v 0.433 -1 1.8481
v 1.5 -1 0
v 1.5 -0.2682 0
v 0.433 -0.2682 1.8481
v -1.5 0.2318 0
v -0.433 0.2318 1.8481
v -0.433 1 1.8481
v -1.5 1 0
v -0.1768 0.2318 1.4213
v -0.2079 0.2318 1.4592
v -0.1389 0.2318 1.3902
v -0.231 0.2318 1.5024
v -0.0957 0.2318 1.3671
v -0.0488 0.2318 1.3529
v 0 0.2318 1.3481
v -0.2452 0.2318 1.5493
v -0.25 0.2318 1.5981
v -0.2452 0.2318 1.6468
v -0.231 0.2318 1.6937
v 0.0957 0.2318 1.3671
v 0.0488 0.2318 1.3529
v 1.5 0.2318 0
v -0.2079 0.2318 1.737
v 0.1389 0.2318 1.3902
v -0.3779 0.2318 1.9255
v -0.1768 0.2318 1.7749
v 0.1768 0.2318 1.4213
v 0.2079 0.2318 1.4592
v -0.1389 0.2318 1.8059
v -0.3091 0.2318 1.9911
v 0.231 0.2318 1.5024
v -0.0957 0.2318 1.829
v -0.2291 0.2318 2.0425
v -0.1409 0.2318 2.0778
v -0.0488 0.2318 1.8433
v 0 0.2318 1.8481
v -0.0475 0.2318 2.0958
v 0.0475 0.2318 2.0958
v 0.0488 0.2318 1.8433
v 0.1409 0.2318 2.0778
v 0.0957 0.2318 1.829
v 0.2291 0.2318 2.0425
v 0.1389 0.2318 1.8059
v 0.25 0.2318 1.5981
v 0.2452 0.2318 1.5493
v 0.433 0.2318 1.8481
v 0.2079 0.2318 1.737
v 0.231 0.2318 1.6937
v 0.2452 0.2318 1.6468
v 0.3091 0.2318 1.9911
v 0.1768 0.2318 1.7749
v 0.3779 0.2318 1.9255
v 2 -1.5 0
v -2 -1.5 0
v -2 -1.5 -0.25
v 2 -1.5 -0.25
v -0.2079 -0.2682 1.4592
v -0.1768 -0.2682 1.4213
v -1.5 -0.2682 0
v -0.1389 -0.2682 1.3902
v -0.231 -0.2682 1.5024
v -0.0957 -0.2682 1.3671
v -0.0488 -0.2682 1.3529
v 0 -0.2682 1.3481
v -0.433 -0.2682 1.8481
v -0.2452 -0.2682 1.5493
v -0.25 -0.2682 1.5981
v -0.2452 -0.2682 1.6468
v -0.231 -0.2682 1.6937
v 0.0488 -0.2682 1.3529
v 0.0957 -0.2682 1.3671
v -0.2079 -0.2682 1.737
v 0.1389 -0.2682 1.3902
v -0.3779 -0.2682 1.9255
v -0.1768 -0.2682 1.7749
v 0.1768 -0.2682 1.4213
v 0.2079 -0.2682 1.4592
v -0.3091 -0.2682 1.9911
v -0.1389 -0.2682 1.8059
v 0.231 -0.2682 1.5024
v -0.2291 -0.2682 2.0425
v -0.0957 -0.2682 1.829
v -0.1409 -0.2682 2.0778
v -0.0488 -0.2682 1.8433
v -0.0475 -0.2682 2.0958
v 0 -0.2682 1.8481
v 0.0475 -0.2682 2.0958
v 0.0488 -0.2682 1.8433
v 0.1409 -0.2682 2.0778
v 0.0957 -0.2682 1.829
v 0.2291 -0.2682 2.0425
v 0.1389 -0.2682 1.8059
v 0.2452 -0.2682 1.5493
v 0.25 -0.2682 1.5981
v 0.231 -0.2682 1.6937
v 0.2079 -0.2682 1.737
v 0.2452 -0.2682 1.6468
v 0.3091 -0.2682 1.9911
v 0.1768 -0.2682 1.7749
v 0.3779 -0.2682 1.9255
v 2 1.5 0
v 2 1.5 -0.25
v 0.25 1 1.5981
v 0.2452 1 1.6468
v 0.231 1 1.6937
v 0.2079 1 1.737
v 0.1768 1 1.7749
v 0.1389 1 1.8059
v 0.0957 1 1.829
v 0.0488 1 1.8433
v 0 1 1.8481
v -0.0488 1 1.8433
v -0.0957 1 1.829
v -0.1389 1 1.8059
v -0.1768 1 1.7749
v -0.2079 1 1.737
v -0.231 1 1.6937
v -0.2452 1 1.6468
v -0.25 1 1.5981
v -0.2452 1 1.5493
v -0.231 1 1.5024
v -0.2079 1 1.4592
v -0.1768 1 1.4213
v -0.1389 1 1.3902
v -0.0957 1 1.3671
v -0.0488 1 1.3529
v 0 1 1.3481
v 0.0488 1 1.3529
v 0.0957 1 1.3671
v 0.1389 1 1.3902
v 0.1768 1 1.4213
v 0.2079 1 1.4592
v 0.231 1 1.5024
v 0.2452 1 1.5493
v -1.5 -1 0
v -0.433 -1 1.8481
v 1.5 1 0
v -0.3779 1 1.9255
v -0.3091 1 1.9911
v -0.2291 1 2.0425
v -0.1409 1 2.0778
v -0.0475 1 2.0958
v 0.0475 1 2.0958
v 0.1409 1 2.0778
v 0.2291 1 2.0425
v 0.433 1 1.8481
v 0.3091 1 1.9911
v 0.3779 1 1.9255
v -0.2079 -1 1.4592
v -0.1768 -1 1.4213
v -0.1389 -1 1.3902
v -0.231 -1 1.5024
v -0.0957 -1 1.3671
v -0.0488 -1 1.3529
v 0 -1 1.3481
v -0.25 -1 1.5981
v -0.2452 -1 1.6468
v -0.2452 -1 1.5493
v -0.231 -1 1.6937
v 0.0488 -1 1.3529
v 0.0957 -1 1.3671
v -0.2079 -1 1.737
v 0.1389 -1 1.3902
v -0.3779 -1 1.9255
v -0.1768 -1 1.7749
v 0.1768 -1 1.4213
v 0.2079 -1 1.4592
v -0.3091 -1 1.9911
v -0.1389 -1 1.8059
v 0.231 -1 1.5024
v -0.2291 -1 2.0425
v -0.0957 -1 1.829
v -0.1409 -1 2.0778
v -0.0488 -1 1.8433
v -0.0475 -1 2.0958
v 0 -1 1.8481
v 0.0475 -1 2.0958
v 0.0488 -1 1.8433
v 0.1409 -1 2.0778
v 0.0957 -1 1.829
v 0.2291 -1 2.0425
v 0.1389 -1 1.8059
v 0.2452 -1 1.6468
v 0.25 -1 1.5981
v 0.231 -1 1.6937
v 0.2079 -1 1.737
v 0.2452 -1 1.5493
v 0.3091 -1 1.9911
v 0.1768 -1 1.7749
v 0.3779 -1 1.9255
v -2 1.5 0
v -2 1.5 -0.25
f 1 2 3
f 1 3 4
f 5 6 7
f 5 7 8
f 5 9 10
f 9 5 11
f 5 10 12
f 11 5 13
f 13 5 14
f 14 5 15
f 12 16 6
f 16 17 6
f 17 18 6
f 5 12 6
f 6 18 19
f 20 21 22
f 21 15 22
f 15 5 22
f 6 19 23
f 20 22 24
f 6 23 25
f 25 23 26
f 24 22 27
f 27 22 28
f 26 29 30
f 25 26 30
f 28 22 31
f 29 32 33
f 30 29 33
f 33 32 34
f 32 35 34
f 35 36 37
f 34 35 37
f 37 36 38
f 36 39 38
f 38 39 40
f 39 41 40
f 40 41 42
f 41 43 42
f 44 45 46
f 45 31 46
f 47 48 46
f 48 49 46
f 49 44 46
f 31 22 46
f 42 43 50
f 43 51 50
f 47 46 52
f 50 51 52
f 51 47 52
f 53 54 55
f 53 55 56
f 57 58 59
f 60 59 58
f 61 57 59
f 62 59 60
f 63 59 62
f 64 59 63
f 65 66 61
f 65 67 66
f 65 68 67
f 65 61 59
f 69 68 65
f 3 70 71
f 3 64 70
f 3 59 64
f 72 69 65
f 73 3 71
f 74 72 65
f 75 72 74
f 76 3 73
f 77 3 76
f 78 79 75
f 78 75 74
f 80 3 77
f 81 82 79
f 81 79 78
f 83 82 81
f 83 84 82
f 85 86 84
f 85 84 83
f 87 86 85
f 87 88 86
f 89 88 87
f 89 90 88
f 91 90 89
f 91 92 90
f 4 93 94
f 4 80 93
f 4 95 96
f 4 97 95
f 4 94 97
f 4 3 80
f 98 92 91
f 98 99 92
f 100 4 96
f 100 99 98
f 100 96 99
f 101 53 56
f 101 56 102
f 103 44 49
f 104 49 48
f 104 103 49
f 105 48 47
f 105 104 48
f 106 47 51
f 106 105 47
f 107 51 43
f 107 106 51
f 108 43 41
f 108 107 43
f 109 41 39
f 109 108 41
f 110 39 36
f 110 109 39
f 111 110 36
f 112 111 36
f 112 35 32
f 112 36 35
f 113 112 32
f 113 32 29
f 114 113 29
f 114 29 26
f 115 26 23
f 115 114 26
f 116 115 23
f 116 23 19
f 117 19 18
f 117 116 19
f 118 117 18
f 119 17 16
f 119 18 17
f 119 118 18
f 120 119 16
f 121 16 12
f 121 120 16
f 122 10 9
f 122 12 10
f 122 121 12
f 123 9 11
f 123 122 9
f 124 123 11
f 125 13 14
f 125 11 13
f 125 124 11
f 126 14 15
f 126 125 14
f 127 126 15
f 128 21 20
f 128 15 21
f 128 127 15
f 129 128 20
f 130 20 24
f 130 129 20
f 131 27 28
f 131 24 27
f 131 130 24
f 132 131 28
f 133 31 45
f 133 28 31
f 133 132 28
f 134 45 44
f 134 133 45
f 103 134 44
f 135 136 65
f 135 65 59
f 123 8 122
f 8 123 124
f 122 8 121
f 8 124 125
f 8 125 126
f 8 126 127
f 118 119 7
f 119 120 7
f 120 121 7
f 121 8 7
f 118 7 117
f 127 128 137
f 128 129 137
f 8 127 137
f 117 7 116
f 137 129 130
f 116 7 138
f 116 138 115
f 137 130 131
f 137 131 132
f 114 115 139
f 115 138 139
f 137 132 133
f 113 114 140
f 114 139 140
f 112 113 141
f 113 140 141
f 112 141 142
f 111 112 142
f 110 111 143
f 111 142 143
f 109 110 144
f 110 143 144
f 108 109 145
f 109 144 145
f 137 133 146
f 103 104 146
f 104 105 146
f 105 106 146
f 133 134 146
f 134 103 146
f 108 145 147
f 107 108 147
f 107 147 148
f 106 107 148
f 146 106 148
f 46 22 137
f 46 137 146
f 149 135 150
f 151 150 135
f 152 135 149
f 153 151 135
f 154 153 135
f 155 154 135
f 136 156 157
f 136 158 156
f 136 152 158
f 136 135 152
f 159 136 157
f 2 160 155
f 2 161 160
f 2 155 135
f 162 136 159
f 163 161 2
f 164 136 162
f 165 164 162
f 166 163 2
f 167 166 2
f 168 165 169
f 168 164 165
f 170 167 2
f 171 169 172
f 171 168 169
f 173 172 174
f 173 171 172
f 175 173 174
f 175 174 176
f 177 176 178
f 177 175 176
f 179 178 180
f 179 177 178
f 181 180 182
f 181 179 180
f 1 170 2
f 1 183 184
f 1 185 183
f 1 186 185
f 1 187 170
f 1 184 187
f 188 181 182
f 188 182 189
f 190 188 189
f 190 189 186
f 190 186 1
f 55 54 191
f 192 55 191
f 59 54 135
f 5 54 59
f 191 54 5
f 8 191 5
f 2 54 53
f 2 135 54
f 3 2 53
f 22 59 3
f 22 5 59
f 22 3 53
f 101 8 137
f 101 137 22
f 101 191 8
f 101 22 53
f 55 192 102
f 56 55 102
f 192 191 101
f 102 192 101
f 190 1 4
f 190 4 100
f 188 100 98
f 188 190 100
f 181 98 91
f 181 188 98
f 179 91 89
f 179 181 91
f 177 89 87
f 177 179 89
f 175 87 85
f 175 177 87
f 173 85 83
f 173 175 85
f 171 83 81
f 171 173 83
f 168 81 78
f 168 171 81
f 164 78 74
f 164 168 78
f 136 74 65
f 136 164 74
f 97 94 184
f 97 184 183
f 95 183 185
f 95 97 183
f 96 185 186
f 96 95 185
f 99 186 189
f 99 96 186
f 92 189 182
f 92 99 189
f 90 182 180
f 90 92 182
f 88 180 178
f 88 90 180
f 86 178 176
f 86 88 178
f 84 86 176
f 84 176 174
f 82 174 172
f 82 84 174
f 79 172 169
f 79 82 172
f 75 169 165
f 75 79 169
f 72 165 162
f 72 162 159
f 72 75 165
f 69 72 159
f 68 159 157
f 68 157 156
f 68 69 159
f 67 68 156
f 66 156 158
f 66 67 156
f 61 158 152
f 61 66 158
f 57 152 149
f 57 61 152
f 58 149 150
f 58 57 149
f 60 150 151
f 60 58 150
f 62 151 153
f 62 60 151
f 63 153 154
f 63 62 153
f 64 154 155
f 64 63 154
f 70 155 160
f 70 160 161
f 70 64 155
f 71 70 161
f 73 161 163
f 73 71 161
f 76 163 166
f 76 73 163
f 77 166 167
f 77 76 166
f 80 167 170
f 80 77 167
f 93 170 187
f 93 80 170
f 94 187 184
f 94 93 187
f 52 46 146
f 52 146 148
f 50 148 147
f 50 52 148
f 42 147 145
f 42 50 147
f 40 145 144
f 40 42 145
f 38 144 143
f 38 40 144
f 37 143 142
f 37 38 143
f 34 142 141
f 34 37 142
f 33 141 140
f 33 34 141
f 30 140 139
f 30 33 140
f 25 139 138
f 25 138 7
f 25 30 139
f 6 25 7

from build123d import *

# Parameters (mm, degrees)
F0_W     = 4
F0_H     = 3
F1_DEPTH = 0.25
F2_R     = 0.25
F3_DEPTH = 1
F4_W     = 0.5
F4_H     = 2.124262
F5_DEPTH = 12.5


with BuildPart() as f1:
    # F0 (on Top) → F1 (new body)
    with BuildSketch(Plane.XY):
        Rectangle(F0_W, F0_H)
    extrude(amount=-F1_DEPTH)

    # F2 (on Front) → F3 (join, symmetric)
    with BuildSketch(Plane.XZ):
        with BuildLine():
            Line((-0.433013, 1.848076), (-1.5, 0))
            Line((-1.5, 0), (1.5, 0))
            Line((1.5, 0), (0.433013, 1.848076))
            ThreePointArc((0.433013, 1.848076), (0, 2.098076), (-0.433013, 1.848076))
        make_face()
        with Locations((0, 1.598076)):
            Circle(F2_R, mode=Mode.SUBTRACT)
    extrude(amount=F3_DEPTH, both=True)

    # F4 (on Right) → F5 (cut, symmetric)
    with BuildSketch(Plane.YZ):
        with Locations((-0.018185, 1.062131)):
            Rectangle(F4_W, F4_H)
    extrude(amount=F5_DEPTH, both=True, mode=Mode.SUBTRACT)


solid = f1.part
